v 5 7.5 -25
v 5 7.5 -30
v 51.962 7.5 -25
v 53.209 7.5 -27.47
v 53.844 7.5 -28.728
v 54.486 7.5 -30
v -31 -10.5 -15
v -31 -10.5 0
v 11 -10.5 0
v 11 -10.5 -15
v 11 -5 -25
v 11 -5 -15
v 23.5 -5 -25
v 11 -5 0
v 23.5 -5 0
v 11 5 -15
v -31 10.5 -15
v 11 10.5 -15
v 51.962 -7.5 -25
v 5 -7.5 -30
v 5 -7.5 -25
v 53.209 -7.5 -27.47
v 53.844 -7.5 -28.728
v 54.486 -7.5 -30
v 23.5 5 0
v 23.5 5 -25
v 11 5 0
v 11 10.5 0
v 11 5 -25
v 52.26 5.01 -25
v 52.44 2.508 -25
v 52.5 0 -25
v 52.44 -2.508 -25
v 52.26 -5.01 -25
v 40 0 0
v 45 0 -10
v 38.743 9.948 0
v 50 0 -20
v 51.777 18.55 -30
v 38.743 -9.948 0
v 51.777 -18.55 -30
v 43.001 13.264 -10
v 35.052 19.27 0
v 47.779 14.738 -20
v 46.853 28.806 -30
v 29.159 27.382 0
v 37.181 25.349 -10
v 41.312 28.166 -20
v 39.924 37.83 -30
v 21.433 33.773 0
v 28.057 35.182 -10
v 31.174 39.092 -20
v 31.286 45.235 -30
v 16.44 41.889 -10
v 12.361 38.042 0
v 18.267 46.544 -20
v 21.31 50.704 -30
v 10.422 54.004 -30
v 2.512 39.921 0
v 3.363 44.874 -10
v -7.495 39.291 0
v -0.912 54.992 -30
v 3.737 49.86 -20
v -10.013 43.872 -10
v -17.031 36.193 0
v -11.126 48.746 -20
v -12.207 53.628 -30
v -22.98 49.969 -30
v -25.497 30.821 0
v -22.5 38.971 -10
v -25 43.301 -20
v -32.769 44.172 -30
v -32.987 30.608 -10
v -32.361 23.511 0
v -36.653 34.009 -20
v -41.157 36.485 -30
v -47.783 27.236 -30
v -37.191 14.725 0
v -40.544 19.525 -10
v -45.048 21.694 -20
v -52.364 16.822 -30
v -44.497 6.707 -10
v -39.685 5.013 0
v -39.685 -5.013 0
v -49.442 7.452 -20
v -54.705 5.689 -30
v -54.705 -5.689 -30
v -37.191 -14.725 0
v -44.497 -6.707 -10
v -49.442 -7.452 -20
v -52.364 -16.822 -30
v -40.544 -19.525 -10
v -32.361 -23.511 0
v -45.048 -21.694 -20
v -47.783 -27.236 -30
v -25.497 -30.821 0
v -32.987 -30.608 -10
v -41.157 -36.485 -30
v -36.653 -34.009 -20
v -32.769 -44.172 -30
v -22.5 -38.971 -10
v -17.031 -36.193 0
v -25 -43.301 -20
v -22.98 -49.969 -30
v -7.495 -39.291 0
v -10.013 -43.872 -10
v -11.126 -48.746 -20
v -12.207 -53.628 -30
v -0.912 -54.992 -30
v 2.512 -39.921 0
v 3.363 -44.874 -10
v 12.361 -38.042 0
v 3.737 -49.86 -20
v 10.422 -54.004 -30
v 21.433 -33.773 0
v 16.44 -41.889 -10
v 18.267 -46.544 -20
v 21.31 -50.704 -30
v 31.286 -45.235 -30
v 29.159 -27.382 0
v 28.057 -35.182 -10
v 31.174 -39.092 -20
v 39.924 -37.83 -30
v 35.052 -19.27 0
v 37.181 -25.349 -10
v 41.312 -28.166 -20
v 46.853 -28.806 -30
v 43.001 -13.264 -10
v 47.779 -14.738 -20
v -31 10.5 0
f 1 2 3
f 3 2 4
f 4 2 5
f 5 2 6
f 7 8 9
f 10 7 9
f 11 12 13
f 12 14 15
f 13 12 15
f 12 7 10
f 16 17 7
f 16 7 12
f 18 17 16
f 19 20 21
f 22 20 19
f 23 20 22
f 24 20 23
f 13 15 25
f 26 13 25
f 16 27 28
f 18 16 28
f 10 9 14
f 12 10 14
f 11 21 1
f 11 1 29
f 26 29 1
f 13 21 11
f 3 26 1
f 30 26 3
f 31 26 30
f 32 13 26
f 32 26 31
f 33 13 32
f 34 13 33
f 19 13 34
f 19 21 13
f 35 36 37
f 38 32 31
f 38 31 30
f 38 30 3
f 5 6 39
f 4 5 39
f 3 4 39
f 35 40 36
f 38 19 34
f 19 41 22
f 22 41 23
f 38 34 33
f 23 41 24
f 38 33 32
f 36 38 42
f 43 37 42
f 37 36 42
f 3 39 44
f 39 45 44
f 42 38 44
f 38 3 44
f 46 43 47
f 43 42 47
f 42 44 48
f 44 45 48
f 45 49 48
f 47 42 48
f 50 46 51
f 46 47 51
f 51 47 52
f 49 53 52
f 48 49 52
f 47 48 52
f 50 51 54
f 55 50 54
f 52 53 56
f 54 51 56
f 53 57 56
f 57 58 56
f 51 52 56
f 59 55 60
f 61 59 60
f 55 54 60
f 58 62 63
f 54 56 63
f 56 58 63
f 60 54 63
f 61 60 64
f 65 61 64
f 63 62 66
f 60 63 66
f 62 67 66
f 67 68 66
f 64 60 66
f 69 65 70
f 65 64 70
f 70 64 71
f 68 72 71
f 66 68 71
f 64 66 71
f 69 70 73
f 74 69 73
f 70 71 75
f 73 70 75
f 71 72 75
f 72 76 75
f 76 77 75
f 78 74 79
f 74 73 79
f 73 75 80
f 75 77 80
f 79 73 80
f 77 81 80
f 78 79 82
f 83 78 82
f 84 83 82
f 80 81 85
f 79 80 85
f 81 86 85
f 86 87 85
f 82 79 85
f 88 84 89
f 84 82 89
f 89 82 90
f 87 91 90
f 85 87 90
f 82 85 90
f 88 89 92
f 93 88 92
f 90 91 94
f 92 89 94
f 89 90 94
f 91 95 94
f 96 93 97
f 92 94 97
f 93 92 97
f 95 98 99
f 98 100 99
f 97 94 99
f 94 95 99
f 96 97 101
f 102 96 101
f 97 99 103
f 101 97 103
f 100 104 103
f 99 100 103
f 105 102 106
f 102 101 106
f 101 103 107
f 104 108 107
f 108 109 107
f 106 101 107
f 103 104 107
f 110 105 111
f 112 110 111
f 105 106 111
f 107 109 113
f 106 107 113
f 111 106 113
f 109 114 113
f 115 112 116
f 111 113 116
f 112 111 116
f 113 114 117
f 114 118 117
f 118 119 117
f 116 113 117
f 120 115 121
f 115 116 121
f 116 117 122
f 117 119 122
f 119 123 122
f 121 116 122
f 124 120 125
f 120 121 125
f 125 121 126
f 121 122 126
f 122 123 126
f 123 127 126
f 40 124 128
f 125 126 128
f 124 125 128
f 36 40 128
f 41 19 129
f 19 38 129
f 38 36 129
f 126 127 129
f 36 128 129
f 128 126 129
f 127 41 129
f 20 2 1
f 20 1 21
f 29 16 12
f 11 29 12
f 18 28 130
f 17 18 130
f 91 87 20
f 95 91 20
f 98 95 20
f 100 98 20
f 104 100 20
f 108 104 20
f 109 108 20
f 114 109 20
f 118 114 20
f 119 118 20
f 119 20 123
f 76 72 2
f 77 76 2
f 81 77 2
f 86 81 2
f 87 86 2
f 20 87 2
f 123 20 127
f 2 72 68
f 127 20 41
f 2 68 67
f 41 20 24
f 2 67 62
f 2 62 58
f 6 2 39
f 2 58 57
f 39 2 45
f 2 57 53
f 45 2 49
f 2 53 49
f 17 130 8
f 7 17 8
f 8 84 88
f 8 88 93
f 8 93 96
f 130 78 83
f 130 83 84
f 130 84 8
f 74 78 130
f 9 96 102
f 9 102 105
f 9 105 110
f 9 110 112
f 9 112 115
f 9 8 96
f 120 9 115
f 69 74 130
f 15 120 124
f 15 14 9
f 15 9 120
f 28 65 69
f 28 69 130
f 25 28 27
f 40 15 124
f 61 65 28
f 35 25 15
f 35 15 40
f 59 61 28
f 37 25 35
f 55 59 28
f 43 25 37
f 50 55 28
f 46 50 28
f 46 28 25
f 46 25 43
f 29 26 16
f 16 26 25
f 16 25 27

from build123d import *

# Parameters (mm, degrees)
F0_R      = 40
F2_R      = 55
F3_W      = 11
F3_H      = 10.5
F5_DEPTH  = 15
F7_W      = 51.318744
F7_H      = 15
F8_DEPTH  = 5
F10_DEPTH = 25


with BuildPart() as f4:
    # F0 (on Top) → F4 section 0
    with BuildSketch(Plane.XY):
        Circle(F0_R)
    # F2 (on offset) → F4 section 1
    with BuildSketch(Plane.XY.offset(-30)):
        Circle(F2_R)
    loft()

    # F3 (on Top) → F5 (cut)
    with BuildSketch(Plane.XY):
        Polygon((0, 0), (0, 10.5), (-31, 10.5), (-31, -10.5), (11, -10.5), (11, 0), align=None)
        with Locations((5.5, 5.25)):
            Rectangle(F3_W, F3_H)
    extrude(amount=-F5_DEPTH, mode=Mode.SUBTRACT)

    # F7 (on face) → F8 (cut)
    with BuildSketch(Plane(origin=(0, 0, -30), x_dir=(1, 0, 0), z_dir=(0, 0, -1))):
        with Locations((30.659372, 0)):
            Rectangle(F7_W, F7_H)
    extrude(amount=-F8_DEPTH, mode=Mode.SUBTRACT)

    # F9 (on face) → F10 (cut)
    with BuildSketch(Plane.XY):
        Polygon((11, 5), (11, 0), (11, -5), (23.5, -5), (23.5, 5), align=None)
    extrude(amount=-F10_DEPTH, mode=Mode.SUBTRACT)


solid = f4.part
